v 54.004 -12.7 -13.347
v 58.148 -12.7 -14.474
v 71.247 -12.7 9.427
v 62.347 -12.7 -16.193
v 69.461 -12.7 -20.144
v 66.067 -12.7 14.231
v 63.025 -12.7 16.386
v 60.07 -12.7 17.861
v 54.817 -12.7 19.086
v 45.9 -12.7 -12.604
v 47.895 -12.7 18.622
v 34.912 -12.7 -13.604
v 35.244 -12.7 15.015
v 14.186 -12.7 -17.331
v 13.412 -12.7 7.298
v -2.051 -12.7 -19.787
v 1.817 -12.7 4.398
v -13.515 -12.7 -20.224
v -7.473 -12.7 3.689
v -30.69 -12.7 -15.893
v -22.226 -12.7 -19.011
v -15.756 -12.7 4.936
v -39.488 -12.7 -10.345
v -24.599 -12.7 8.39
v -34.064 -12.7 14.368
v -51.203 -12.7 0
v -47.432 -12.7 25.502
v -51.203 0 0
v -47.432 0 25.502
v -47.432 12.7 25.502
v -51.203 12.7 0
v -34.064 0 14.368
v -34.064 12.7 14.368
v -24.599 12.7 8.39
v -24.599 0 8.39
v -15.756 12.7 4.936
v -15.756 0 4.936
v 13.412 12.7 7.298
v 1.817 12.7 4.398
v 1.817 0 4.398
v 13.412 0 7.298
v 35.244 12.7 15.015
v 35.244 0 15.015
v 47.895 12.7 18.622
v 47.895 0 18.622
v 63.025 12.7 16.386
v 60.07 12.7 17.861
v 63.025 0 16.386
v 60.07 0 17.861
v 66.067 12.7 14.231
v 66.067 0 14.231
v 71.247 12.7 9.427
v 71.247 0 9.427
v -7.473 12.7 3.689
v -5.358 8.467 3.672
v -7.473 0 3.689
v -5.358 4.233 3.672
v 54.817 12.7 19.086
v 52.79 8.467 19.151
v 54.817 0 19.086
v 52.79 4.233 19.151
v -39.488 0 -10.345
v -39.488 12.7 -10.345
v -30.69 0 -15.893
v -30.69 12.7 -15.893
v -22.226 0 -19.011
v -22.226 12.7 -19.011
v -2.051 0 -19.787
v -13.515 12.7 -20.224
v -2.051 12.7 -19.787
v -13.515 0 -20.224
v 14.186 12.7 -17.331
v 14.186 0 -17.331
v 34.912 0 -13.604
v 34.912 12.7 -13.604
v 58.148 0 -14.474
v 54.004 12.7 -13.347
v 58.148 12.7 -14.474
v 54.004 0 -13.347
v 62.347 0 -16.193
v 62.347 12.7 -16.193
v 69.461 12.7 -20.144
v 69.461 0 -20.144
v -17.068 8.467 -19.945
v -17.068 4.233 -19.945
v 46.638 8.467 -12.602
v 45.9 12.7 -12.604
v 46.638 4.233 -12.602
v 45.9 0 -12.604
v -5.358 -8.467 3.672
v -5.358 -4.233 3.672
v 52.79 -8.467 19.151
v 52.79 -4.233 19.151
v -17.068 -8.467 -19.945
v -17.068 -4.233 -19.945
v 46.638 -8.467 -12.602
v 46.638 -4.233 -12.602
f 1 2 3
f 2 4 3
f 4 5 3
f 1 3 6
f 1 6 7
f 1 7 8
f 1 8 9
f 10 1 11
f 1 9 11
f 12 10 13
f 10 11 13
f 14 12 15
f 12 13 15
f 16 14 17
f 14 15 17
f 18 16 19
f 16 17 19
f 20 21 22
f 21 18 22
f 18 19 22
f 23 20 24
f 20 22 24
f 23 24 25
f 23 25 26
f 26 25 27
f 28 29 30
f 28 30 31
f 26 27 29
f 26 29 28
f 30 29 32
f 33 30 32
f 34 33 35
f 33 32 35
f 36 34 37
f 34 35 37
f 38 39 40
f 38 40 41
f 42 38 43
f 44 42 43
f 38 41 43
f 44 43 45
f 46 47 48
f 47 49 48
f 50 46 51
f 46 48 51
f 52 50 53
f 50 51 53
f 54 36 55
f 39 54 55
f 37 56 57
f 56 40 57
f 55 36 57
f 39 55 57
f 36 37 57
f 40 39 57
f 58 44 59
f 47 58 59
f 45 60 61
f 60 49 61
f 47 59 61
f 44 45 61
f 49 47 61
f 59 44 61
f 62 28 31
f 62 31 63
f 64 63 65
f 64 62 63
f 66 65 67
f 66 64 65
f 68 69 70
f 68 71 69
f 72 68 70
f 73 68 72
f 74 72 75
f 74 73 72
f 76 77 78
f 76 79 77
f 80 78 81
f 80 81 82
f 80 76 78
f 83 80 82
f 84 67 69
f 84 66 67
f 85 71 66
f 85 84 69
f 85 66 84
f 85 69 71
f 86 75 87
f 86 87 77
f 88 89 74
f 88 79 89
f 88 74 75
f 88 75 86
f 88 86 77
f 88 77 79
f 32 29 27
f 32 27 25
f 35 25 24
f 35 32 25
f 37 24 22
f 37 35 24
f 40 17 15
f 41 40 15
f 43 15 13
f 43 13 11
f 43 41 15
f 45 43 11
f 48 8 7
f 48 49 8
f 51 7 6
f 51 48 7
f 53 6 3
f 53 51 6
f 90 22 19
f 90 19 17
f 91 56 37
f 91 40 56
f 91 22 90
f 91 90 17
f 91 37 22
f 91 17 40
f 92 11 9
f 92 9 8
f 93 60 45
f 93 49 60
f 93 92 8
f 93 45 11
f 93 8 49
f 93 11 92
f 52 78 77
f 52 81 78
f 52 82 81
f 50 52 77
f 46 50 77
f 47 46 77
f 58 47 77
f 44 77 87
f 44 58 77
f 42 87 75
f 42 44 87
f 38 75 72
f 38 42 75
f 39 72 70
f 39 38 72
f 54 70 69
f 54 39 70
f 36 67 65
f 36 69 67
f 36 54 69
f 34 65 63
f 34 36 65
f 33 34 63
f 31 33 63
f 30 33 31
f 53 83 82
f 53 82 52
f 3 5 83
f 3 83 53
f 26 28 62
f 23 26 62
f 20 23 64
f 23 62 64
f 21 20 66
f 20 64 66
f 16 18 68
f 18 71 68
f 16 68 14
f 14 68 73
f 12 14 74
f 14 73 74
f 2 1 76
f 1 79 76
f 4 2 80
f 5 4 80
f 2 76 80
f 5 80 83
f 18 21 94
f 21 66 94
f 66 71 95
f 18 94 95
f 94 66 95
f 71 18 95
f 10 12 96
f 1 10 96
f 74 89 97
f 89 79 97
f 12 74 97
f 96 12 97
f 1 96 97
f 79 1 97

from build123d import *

# Parameters (mm, degrees)
F1_DEPTH = 12.7


with BuildPart() as f1:
    # F0 (on Front) → F1 (new body, symmetric)
    with BuildSketch(Plane.XZ):
        with BuildLine():
            add(Edge.make_bspline(
                [(-47.4320463836, 25.5021620542), (-34.862781868, 14.4202130024), (-8.1314968339, -9.1479709967), (52.8445386323, 27.667796396), (66.271357968, 14.3590469203), (71.2472945452, 9.426866658)],
                knots=[0, 0, 0, 0, 0.3584052589, 0.7622270279, 1, 1, 1, 1], degree=3))
            Line((-47.4320463836, 25.5021620542), (-51.2027963996, 0))
            add(Edge.make_bspline(
                [(-51.2027963996, 0), (-41.6162605359, -9.0968015613), (-19.8203713943, -29.7792337967), (46.7679164935, -6.5646843288), (63.2153754641, -16.4064232076), (69.4611519575, -20.1437361538)],
                knots=[0, 0, 0, 0, 0.3275116722, 0.7446285291, 1, 1, 1, 1], degree=3))
            Line((69.4611519575, -20.1437361538), (71.2472945452, 9.426866658))
        make_face()
    extrude(amount=F1_DEPTH, both=True)


solid = f1.part
